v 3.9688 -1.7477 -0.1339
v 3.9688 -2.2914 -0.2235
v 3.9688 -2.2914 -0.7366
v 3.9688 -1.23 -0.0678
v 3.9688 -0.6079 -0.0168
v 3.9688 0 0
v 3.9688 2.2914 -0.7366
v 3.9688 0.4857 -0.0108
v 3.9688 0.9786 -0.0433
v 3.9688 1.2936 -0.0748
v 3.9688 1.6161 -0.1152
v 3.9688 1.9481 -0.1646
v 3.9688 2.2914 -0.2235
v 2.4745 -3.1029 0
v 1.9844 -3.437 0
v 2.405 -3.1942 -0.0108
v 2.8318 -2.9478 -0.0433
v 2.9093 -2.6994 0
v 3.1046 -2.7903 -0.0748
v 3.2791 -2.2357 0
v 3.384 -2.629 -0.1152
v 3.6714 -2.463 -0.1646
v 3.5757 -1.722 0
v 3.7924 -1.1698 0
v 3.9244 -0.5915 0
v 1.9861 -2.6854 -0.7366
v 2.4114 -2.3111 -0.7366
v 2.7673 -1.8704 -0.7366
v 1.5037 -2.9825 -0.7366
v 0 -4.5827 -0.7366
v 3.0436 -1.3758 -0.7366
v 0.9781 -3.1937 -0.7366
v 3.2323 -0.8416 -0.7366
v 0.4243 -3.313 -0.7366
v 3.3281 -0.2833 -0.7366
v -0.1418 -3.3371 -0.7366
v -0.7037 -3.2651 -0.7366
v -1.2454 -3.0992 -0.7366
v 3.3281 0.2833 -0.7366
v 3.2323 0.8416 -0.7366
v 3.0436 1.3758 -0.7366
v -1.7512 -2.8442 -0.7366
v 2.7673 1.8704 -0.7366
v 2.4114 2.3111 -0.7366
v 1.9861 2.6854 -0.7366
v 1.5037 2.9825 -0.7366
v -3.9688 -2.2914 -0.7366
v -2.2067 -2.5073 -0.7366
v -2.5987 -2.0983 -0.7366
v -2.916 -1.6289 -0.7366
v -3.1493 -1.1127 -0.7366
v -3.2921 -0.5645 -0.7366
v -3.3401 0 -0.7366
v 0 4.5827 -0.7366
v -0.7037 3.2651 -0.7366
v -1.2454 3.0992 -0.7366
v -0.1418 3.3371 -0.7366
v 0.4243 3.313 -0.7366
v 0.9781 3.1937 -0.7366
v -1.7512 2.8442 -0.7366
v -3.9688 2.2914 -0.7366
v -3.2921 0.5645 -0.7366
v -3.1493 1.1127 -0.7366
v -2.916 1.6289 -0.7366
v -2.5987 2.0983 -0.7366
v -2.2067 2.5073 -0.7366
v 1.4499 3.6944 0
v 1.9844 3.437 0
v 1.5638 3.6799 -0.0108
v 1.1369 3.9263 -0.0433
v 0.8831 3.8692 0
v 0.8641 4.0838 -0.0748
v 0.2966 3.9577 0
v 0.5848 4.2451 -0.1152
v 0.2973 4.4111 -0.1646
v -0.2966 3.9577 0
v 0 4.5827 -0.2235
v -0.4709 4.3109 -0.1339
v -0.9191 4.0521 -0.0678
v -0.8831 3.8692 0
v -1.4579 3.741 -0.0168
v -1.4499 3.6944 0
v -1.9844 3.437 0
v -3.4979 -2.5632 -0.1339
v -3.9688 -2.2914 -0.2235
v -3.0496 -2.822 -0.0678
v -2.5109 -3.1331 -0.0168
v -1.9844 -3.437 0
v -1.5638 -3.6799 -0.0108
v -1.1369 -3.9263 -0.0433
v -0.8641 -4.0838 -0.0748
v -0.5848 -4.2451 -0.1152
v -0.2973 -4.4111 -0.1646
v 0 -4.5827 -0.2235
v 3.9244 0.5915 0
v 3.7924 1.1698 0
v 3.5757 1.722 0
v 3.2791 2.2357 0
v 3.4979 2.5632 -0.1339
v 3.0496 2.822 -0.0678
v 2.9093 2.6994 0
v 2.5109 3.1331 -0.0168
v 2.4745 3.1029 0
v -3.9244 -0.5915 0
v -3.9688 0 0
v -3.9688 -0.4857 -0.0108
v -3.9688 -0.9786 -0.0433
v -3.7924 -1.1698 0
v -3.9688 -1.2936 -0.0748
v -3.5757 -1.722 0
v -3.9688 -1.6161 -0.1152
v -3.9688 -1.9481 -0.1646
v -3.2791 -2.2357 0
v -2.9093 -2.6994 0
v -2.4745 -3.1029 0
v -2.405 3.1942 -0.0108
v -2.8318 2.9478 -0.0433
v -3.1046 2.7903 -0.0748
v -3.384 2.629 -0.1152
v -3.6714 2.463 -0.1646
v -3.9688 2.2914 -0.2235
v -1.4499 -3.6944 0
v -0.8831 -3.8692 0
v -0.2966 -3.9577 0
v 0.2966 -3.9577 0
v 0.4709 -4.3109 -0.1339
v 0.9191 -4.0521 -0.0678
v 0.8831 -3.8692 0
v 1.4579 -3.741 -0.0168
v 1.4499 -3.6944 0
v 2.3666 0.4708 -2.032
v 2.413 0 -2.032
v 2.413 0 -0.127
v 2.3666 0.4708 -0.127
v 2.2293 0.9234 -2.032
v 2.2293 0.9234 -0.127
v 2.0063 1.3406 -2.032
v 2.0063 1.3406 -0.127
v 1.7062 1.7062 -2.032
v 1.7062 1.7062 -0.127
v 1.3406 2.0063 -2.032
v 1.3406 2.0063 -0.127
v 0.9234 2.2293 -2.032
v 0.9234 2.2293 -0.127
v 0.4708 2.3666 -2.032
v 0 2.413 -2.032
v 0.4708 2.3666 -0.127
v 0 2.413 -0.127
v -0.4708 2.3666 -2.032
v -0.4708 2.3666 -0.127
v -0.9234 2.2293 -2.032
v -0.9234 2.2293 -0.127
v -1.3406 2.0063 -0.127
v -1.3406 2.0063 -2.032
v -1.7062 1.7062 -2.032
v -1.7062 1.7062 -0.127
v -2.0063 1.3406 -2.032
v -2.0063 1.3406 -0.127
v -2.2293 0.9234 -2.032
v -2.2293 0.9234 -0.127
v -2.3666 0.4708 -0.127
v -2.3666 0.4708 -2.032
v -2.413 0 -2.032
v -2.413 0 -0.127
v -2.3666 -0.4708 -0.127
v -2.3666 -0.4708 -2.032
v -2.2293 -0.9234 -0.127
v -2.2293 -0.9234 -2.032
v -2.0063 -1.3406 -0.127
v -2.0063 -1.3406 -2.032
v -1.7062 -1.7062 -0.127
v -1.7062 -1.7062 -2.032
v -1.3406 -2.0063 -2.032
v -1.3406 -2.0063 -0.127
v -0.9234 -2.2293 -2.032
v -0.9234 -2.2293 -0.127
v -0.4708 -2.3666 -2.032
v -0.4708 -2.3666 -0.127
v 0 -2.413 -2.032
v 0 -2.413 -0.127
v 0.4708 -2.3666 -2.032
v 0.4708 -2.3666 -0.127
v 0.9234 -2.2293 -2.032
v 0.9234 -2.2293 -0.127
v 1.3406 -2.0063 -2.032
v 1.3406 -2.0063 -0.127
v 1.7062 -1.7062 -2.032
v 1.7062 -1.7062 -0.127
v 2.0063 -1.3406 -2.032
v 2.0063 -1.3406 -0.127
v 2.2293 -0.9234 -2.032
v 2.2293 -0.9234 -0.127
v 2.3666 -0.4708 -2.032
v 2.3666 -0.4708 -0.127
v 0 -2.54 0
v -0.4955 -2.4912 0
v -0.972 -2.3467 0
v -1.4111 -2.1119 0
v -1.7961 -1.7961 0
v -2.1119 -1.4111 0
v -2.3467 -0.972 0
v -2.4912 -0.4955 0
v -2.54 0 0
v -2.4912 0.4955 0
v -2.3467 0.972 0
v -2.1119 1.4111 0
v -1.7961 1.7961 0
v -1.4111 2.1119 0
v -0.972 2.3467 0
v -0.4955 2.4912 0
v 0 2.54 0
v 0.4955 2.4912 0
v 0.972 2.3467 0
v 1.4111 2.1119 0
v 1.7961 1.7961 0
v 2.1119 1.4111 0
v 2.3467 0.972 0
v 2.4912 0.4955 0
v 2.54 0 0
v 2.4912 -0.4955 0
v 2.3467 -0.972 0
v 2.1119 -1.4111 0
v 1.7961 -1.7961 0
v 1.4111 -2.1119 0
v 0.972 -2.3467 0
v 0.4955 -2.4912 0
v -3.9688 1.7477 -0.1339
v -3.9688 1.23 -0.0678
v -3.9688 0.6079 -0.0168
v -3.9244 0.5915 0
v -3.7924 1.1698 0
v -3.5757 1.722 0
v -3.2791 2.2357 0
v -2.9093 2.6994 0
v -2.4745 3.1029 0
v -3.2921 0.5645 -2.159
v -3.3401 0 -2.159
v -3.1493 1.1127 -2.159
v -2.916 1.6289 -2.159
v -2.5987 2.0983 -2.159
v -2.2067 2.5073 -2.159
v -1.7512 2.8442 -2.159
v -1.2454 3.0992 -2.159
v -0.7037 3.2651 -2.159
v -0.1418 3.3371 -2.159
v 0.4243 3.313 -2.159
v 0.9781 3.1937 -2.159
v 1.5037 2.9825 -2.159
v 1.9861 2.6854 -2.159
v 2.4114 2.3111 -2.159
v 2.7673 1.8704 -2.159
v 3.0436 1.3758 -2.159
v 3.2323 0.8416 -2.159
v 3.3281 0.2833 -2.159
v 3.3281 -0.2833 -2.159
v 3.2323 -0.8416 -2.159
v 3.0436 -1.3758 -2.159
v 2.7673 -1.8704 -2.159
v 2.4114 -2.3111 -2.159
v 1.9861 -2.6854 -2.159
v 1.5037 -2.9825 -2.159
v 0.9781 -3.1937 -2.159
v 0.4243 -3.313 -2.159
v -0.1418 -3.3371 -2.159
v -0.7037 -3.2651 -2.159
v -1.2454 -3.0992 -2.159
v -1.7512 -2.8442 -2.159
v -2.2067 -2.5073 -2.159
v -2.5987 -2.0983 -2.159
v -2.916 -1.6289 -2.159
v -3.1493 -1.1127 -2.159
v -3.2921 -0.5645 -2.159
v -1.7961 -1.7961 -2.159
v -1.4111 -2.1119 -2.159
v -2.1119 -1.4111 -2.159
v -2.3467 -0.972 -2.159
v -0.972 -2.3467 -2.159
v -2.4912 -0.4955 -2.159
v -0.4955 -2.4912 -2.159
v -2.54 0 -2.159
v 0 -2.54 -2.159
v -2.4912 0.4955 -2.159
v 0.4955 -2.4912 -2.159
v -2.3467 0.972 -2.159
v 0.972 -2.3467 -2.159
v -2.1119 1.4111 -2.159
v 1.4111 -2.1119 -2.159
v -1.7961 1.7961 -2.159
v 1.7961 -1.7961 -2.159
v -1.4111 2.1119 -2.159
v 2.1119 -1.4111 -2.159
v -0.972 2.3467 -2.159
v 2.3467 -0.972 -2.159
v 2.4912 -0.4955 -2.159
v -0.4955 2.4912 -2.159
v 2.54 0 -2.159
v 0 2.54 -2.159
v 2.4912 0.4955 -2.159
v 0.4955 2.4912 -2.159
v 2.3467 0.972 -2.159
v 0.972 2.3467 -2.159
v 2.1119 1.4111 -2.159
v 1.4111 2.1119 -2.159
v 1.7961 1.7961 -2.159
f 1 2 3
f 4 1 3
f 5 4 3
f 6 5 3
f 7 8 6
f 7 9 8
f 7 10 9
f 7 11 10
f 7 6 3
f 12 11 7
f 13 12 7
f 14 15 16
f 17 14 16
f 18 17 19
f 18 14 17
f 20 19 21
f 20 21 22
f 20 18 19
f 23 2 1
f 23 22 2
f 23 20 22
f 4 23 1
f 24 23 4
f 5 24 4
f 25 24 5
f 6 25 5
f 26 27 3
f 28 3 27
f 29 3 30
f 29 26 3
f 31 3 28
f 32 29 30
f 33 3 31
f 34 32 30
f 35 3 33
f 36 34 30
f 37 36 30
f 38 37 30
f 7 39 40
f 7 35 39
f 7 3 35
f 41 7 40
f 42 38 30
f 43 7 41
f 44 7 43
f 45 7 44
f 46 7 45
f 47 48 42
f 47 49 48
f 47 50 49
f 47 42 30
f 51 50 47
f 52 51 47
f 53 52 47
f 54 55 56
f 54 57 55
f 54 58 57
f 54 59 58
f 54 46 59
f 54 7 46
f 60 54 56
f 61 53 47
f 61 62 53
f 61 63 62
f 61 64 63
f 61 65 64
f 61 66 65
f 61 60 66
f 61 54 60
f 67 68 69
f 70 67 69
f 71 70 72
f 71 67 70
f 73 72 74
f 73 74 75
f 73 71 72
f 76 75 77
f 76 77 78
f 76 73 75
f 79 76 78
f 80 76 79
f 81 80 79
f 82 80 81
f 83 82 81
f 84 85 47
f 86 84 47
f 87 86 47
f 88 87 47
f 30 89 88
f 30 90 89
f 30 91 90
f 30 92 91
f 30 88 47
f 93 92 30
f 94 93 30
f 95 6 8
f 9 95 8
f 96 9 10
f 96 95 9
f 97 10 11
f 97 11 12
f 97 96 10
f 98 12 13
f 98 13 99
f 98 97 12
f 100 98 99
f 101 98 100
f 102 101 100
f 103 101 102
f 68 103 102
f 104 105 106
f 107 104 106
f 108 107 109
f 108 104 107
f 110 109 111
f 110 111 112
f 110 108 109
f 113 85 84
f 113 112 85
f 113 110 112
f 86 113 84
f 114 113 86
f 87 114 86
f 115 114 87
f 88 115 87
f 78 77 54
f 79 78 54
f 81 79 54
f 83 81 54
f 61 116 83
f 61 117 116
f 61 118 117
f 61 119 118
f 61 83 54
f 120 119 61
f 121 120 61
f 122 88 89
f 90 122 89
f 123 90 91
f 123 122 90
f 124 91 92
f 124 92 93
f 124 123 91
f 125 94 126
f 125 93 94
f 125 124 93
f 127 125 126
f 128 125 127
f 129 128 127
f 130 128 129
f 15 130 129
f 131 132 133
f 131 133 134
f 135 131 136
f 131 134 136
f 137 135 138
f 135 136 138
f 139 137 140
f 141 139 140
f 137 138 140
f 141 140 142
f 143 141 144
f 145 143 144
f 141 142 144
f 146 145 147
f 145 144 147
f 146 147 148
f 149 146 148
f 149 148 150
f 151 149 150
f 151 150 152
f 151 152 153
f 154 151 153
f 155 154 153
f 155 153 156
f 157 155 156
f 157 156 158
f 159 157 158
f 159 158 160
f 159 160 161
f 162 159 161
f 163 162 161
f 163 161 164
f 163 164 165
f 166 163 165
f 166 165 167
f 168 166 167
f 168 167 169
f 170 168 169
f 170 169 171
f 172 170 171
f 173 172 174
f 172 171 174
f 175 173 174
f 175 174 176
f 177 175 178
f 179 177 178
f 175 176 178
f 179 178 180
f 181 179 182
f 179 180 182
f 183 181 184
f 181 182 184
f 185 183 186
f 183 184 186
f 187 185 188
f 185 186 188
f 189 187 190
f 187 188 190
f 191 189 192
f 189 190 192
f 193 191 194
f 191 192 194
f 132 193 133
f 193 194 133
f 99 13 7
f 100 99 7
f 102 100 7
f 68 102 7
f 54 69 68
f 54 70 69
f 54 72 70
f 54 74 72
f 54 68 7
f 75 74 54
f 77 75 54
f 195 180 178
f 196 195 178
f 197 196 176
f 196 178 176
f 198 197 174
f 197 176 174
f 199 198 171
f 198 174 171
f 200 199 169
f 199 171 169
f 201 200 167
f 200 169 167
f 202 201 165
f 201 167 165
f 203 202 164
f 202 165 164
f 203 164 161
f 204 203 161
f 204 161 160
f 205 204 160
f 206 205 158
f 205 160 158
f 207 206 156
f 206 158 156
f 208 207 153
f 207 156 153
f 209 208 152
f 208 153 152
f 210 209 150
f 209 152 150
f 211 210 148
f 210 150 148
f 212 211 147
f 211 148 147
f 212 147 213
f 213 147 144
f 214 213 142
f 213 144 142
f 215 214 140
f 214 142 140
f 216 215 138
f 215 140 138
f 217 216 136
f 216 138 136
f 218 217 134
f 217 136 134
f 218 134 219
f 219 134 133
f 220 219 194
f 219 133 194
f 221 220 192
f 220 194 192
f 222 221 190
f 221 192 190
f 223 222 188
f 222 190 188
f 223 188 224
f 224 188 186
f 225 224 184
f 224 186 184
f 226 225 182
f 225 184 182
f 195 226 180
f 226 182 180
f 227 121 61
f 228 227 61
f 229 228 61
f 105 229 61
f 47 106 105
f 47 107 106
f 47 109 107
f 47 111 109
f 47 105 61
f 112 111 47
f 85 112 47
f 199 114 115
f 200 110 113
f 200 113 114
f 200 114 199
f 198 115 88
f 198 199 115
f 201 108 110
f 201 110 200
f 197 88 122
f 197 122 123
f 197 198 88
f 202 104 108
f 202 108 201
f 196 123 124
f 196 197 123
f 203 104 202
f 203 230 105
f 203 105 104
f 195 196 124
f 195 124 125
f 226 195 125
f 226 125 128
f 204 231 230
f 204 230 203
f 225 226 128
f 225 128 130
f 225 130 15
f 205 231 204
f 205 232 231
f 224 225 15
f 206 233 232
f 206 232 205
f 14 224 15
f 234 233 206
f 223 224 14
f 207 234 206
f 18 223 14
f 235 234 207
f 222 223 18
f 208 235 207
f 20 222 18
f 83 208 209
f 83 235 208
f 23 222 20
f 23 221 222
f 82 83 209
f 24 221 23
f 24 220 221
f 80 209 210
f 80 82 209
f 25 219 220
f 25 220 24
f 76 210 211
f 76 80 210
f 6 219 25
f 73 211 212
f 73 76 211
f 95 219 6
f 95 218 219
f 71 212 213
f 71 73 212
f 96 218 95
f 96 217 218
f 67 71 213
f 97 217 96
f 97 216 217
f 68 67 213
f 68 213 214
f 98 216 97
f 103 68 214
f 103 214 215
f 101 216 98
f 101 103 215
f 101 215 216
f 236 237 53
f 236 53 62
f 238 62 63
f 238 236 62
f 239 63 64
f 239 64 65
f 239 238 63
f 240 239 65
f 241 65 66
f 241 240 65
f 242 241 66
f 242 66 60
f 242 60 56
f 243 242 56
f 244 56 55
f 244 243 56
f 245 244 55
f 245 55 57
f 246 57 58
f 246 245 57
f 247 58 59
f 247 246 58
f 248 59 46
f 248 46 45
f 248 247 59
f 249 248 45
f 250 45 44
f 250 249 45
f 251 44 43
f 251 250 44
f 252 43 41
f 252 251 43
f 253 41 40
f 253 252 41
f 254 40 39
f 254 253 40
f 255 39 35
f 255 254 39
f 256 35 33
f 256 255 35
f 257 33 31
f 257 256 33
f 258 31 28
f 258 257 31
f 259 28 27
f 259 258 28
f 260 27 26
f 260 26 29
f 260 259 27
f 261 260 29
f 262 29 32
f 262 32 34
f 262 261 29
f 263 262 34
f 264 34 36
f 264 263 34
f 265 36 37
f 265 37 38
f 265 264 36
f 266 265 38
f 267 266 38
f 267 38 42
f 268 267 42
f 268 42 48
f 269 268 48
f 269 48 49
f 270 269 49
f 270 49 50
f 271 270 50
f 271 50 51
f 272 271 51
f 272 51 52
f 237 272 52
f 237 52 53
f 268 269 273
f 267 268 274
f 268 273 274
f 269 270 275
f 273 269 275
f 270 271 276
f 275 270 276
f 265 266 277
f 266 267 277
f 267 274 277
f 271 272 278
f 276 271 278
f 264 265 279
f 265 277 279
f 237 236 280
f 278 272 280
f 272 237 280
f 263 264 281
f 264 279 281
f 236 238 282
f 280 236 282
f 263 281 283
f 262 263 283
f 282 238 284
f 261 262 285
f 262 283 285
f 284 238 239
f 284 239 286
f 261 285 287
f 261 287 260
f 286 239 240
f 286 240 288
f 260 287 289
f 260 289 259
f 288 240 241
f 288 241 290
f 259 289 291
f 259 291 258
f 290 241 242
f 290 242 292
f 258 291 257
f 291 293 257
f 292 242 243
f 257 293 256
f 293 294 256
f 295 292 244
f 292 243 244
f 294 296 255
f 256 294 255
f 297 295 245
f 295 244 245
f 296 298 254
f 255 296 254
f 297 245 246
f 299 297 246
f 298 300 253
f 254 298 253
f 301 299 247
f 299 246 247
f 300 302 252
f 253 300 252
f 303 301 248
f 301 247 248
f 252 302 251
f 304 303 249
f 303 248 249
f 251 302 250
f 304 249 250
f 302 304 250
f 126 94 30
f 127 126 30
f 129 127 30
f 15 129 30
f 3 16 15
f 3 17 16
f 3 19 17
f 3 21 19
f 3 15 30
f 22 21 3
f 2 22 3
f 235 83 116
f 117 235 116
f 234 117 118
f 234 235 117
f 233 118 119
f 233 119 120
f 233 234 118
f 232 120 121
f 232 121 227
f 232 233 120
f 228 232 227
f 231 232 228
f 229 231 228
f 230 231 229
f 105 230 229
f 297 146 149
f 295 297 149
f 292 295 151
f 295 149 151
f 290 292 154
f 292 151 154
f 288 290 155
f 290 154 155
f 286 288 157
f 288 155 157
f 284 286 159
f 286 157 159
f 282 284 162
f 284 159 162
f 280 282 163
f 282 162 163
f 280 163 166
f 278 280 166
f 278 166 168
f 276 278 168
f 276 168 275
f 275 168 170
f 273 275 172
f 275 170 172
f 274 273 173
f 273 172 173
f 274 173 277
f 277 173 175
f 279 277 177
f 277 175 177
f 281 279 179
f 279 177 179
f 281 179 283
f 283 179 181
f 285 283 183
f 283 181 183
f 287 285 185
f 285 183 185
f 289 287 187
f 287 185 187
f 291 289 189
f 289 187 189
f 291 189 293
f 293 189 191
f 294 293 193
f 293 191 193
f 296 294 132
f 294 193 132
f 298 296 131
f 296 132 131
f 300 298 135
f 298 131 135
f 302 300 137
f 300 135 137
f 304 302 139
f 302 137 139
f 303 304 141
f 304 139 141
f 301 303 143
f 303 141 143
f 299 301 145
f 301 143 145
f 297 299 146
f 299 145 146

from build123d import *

# Parameters (mm, degrees)
EXTRUDE1_DEPTH      = 2.159
SKETCH14_OUTSIDE_W  = 12.402
SKETCH14_OUTSIDE_H  = 13.63
SKETCH14_OUTSIDE_R  = 3.3401
CUT_EXTRUDE7_DEPTH  = 1.4224
SKETCH7_R           = 2.413
CUT_EXTRUDE3_DEPTH  = 7.435336794
SKETCH20_OUTSIDE_W  = 53.258
SKETCH20_OUTSIDE_H  = 54.486
SKETCH20_OUTSIDE_R  = 3.96875
CUT_EXTRUDE13_DEPTH = 7.435336794
CUT_EXTRUDE13_DRAFT = -70


with BuildPart() as part:
    # Sketch1 → Extrude1 (new body)
    with BuildSketch(Plane.XY):
        Polygon((0, 4.582717762), (-3.96875, 2.291358881), (-3.96875, -2.291358881), (0, -4.582717762), (3.96875, -2.291358881), (3.96875, 2.291358881), align=None)
    extrude(amount=-EXTRUDE1_DEPTH)

    # Sketch14 outside → Cut-Extrude7 (cut)
    with BuildSketch(Plane(origin=(0, 0, -2.159), x_dir=(-1, 0, 0), z_dir=(0, 0, -1))):
        Rectangle(SKETCH14_OUTSIDE_W, SKETCH14_OUTSIDE_H)
        Circle(SKETCH14_OUTSIDE_R, mode=Mode.SUBTRACT)
    extrude(amount=-CUT_EXTRUDE7_DEPTH, mode=Mode.SUBTRACT)

    # Sketch7 → Cut-Extrude3 (cut, through all)
    with BuildSketch(Plane.XY):
        Circle(SKETCH7_R)
    extrude(amount=-CUT_EXTRUDE3_DEPTH, mode=Mode.SUBTRACT)

    # Cut-Extrude6 cone 1 section (through the dimple's axis) → Cut-Extrude6 (revolve, cut)
    with BuildSketch(Plane(origin=(0, 0, 0), x_dir=(0, -1, 0), z_dir=(1, 0, 0))):
        Polygon((0, 0), (2.54, 0), (0, 2.54), align=None)
    revolve(axis=Axis((0, 0, 0), (0, 0, -1)), mode=Mode.SUBTRACT)

    # Cut-Extrude11 cone 1 section (through the dimple's axis) → Cut-Extrude11 (revolve, cut)
    with BuildSketch(Plane(origin=(0, 0, -2.159), x_dir=(0, 1, 0), z_dir=(1, 0, 0))):
        Polygon((0, 0), (2.54, 0), (0, 2.54), align=None)
    revolve(axis=Axis((0, 0, -2.159), (0, 0, 1)), mode=Mode.SUBTRACT)


with BuildPart() as cut_extrude13_tool:
    # Sketch20 outside → Cut-Extrude13 (with draft: the straight prism first)
    with BuildSketch(Plane.XY):
        Rectangle(SKETCH20_OUTSIDE_W, SKETCH20_OUTSIDE_H)
        Circle(SKETCH20_OUTSIDE_R, mode=Mode.SUBTRACT)
    extrude(amount=-CUT_EXTRUDE13_DEPTH)
    # Cut-Extrude13: the draft: its side faces are tilted about the plane it starts from
    cut_extrude13_sides = [cut_extrude13_tool.faces().sort_by_distance(p)[0] for p in [
        (0, -27.243, -3.717668397),
        (26.629, 0, -3.717668397),
        (0, 27.243, -3.717668397),
        (-26.629, 0, -3.717668397),
        (-3.96875, 0, -3.717668397),
    ]]
    draft(cut_extrude13_sides, Plane.XY, CUT_EXTRUDE13_DRAFT)


with BuildPart() as part_1:
    add(part.part)

    # Cut-Extrude13: cut by cut_extrude13_tool
    add(cut_extrude13_tool.part, mode=Mode.SUBTRACT)


solid = part_1.part
